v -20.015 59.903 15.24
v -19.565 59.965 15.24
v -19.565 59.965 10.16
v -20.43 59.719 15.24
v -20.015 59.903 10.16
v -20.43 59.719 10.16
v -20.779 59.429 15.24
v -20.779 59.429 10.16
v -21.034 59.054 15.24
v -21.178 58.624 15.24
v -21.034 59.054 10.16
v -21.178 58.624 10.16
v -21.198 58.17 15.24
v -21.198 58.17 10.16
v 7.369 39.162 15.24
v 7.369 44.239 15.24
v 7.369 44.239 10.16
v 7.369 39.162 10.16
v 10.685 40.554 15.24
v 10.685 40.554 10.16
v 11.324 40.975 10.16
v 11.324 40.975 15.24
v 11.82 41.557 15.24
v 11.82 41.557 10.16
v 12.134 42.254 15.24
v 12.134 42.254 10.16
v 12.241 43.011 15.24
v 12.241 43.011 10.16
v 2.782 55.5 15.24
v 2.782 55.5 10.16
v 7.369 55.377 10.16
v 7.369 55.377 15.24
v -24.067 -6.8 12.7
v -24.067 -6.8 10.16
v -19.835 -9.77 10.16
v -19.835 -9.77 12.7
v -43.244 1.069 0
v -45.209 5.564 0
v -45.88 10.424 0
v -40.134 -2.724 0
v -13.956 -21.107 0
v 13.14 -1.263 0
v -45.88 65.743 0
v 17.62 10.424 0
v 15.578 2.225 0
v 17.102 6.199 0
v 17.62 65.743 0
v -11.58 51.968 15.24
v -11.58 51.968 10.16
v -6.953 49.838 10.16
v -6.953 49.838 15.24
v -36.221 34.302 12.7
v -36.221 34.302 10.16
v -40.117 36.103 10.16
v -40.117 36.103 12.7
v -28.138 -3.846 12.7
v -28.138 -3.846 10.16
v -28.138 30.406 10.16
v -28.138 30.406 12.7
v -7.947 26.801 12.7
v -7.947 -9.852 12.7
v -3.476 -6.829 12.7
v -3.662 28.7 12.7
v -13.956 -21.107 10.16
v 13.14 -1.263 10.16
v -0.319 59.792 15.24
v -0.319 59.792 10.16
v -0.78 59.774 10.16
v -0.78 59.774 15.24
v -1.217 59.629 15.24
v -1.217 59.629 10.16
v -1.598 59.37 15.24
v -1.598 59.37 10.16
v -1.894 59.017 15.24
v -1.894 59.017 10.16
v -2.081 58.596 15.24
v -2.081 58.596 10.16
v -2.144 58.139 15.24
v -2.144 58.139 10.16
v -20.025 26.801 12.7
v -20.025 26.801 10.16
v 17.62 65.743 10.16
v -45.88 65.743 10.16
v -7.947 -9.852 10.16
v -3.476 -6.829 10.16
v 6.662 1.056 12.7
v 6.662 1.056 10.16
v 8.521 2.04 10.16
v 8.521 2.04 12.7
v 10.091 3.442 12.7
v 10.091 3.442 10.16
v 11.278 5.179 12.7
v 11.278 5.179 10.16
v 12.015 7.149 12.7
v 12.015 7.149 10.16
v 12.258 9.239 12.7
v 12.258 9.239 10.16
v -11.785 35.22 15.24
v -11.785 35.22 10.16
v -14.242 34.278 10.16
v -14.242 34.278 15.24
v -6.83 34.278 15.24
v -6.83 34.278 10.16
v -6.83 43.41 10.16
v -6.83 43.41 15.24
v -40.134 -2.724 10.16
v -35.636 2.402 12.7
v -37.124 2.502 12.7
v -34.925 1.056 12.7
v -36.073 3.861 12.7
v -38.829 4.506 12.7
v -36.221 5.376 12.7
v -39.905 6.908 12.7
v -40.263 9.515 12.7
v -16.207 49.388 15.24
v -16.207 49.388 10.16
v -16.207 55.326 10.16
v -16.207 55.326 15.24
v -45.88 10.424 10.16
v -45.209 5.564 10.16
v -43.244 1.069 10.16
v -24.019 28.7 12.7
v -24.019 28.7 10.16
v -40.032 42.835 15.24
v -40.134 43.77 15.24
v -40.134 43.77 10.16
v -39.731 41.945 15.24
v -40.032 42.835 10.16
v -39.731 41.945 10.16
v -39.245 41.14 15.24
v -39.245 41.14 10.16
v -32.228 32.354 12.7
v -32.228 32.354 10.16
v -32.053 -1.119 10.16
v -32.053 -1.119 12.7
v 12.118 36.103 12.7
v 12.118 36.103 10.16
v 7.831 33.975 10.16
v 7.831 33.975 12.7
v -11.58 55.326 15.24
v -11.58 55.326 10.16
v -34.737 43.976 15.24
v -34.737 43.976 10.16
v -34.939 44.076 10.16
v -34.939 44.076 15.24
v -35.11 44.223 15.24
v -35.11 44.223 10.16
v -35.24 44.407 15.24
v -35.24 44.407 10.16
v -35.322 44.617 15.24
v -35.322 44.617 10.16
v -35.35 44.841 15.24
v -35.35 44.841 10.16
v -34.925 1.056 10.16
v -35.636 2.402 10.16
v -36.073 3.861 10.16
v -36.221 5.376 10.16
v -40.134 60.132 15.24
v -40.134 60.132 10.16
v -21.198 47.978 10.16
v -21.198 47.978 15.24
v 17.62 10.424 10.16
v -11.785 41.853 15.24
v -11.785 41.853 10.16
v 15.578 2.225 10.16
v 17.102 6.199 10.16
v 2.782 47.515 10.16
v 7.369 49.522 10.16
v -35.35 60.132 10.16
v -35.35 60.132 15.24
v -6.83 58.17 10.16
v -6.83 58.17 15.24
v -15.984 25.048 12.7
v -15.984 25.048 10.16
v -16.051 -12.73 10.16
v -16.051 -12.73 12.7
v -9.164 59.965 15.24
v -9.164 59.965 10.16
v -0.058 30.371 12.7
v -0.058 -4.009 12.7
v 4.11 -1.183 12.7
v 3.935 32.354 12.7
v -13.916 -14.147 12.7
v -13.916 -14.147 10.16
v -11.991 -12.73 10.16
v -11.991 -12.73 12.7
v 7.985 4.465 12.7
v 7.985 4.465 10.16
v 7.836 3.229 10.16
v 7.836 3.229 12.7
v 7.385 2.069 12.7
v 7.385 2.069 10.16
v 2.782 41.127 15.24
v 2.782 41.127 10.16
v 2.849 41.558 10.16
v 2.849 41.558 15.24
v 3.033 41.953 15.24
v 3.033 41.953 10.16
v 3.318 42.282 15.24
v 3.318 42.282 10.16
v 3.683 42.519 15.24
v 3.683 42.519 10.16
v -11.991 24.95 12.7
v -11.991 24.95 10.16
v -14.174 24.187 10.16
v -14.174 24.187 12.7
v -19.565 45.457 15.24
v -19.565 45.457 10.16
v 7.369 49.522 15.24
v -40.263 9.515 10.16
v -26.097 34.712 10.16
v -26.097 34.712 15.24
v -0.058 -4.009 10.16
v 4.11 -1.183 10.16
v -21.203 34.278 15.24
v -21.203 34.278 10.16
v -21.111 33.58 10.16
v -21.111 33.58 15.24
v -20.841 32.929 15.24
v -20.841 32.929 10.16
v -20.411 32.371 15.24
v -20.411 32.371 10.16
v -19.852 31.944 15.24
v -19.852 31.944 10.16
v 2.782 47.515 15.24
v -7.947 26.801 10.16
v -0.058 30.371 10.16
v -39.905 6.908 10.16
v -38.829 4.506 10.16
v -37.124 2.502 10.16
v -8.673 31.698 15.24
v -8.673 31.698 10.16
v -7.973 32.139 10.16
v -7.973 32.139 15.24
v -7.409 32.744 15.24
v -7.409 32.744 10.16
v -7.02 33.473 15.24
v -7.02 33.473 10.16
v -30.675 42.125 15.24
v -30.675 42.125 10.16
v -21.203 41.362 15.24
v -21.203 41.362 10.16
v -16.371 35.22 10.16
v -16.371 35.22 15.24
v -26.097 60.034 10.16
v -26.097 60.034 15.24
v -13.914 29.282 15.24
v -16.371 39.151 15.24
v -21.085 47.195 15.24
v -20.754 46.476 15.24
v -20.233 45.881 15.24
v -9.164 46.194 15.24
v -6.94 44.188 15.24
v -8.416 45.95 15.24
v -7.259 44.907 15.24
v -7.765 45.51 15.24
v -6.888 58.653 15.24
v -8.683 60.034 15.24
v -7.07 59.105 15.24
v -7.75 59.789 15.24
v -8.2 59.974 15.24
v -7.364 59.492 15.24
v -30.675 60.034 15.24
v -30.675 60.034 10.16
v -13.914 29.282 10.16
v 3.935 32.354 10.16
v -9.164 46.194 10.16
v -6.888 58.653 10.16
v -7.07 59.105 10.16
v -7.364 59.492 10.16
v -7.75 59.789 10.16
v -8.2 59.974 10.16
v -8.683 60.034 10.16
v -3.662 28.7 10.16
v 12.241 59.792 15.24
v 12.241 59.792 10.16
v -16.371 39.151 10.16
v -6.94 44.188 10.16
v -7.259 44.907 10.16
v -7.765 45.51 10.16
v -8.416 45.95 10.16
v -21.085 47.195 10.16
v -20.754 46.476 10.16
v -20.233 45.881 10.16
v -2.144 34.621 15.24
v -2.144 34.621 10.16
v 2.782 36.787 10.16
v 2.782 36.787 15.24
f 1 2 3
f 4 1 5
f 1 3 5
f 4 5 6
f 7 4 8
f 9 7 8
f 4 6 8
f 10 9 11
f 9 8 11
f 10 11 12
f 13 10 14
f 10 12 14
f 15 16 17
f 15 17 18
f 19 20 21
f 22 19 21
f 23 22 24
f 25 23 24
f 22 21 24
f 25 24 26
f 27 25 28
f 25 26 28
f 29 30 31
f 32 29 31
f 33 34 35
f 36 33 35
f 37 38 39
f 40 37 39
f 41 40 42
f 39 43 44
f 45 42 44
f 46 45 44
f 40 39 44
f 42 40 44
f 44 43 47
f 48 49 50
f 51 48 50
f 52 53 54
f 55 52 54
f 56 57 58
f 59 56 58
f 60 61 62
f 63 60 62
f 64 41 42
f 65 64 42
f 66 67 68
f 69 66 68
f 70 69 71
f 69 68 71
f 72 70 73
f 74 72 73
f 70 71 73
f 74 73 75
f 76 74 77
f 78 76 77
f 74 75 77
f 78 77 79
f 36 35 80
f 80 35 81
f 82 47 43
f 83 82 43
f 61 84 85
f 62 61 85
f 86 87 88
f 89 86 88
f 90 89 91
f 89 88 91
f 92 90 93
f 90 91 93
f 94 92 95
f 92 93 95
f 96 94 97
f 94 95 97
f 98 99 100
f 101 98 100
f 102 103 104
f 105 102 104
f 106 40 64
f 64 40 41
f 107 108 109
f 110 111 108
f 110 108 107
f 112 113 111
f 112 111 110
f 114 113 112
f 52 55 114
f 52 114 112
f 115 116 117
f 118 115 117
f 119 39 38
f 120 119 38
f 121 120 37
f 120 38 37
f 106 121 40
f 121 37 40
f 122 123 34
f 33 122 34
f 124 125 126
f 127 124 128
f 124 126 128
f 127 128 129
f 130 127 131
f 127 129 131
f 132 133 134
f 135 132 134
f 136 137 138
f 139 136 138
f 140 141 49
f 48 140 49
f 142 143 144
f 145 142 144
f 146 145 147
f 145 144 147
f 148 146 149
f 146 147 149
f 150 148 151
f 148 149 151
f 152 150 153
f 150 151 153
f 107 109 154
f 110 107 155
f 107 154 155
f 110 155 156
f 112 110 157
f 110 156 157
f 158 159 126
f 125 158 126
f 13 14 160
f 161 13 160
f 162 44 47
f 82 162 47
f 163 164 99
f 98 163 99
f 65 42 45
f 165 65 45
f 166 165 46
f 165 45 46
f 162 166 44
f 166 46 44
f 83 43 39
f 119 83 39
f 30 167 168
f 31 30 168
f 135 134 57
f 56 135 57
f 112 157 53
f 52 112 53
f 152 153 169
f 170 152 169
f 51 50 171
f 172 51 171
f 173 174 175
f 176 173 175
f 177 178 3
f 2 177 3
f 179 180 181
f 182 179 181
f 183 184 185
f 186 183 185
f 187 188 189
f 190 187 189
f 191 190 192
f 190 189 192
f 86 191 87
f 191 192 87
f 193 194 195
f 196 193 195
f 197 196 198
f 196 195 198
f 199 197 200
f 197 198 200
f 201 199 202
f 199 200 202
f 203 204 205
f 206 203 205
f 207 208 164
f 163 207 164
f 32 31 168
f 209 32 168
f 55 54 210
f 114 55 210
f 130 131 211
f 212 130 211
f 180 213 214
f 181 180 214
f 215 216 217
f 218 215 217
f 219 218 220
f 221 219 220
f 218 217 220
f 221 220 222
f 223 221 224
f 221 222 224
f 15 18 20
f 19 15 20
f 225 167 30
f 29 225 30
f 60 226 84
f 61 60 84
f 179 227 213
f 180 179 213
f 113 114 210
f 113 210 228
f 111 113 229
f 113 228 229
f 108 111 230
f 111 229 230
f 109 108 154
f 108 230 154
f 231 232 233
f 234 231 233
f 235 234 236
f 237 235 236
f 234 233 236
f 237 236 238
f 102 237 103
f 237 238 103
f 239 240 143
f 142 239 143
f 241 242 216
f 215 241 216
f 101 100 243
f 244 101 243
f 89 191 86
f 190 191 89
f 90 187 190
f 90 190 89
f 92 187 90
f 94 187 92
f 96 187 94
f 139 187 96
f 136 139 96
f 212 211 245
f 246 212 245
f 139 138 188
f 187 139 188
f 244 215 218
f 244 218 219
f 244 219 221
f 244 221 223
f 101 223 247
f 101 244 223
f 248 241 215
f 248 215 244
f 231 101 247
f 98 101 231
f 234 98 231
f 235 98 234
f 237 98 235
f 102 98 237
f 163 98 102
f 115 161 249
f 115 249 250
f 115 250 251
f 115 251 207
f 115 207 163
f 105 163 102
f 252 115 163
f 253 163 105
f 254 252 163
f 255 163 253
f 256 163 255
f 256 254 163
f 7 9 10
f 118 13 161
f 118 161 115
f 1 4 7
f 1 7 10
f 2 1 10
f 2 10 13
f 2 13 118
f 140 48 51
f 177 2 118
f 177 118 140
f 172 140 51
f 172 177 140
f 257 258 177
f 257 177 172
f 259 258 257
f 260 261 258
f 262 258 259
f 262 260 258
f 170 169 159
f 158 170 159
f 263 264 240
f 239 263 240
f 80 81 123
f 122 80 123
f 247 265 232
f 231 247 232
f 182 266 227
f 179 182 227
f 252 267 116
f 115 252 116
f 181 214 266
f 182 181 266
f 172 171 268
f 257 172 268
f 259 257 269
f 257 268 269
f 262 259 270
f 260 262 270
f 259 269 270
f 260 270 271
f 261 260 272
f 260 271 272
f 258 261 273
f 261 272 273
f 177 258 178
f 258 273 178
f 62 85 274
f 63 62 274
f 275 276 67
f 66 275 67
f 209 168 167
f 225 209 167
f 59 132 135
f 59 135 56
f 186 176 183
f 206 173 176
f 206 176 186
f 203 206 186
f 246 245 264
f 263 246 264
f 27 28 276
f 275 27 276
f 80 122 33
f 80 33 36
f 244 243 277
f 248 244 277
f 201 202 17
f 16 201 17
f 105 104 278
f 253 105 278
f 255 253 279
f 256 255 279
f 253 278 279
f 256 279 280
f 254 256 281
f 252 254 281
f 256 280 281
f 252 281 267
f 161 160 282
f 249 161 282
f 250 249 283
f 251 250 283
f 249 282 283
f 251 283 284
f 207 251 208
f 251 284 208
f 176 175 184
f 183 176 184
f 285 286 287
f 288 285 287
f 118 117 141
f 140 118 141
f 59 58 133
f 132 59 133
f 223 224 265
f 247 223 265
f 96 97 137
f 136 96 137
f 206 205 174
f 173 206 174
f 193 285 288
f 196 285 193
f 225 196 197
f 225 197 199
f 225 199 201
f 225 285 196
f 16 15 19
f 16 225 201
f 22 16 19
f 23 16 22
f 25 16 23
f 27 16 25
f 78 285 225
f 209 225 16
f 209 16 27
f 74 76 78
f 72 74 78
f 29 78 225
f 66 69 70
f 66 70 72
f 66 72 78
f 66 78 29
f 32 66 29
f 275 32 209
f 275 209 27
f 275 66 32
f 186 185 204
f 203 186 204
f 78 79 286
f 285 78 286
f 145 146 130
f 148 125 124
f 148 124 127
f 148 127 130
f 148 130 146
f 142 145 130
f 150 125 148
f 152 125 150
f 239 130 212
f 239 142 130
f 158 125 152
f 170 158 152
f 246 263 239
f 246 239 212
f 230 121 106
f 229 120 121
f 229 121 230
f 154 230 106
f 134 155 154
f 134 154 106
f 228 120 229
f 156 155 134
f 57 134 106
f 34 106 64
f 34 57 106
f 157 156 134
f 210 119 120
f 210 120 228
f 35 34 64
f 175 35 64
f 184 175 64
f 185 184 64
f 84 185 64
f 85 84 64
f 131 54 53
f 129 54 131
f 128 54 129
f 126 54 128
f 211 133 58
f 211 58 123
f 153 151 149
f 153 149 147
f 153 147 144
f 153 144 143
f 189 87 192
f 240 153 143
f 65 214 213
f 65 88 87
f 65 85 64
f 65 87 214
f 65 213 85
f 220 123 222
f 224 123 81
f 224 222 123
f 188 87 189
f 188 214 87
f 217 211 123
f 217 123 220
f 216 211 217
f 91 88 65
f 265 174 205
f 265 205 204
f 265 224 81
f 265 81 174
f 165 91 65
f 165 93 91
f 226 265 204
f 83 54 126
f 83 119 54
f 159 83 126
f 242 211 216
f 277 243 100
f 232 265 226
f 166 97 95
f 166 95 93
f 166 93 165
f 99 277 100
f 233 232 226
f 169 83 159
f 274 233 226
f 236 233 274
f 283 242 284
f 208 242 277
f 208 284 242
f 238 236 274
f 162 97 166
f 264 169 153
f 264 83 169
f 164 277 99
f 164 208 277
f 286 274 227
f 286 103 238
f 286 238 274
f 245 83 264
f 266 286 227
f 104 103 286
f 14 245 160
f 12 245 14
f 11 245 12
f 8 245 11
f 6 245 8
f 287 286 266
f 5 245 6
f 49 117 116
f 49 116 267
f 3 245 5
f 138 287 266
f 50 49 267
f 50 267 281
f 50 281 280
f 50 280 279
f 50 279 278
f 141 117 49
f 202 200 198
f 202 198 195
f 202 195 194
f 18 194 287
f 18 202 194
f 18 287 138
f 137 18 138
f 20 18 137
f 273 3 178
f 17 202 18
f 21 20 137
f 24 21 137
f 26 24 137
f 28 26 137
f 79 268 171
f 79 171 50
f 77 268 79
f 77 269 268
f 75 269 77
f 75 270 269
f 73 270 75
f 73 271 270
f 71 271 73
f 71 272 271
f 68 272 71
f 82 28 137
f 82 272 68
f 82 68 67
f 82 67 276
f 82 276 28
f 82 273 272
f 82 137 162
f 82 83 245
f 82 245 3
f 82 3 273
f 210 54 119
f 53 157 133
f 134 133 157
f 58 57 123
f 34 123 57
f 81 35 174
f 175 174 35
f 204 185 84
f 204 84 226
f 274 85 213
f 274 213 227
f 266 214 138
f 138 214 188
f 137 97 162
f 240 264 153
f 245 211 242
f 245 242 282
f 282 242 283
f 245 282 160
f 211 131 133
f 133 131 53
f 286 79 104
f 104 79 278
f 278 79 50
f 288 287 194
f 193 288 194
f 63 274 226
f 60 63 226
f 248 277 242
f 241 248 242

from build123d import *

# Parameters (mm, degrees)
F1_DEPTH = 15.24
F2_DEPTH = 12.7
F3_DEPTH = 10.16


with BuildPart() as f1:
    # F0 (on Top) → F1 (new body)
    with BuildSketch(Plane.XY):
        with BuildLine():
            Line((-35.3495, 60.131524), (-40.133959, 60.131524))
            Line((-40.133959, 60.131524), (-40.133959, 43.769562))
            ThreePointArc((-40.133959, 43.769562), (-39.905763, 42.381693), (-39.245203, 41.139955))
            Line((-39.245203, 41.139955), (-26.097199, 34.712043))
            Line((-26.097199, 34.712043), (-26.097199, 60.034128))
            Line((-26.097199, 60.034128), (-30.674654, 60.034128))
            Line((-30.674654, 60.034128), (-30.674654, 42.308667))
            Line((-30.674654, 42.308667), (-30.674654, 42.125131))
            Line((-30.674654, 42.125131), (-34.736989, 43.975933))
            ThreePointArc((-34.736989, 43.975933), (-35.180866, 44.310949), (-35.3495, 44.840879))
            Line((-35.3495, 44.840879), (-35.3495, 60.131524))
        make_face()
        with BuildLine():
            Line((-11.580281, 51.967774), (-6.953094, 49.838448))
            Line((-6.953094, 49.838448), (-6.830248, 58.170216))
            ThreePointArc((-6.830248, 58.170216), (-7.547014, 59.653243), (-9.164316, 59.965426))
            Line((-9.164316, 59.965426), (-19.565252, 59.965426))
            ThreePointArc((-19.565252, 59.965426), (-20.778535, 59.428841), (-21.197871, 58.170216))
            Line((-21.197871, 58.170216), (-21.197871, 47.978059))
            ThreePointArc((-21.197871, 47.978059), (-20.754073, 46.476274), (-19.565252, 45.456952))
            Line((-19.565252, 45.456952), (-11.785025, 41.853478))
            Line((-11.785025, 41.853478), (-11.785025, 35.219812))
            Line((-11.785025, 35.219812), (-14.241938, 34.277995))
            Line((-14.241938, 34.277995), (-16.371263, 35.219812))
            Line((-16.371263, 35.219812), (-16.371263, 39.150875))
            Line((-16.371263, 39.150875), (-21.203195, 41.362097))
            Line((-21.203195, 41.362097), (-21.203195, 34.277995))
            ThreePointArc((-21.203195, 34.277995), (-20.840997, 32.929487), (-19.85189, 31.943927))
            Line((-19.85189, 31.943927), (-13.914351, 29.282272))
            Line((-13.914351, 29.282272), (-8.672934, 31.698236))
            ThreePointArc((-8.672934, 31.698236), (-7.409398, 32.743692), (-6.830248, 34.277995))
            Line((-6.830248, 34.277995), (-6.830248, 43.409521))
            ThreePointArc((-6.830248, 43.409521), (-7.490944, 45.226204), (-9.164316, 46.194026))
            Line((-9.164316, 46.194026), (-16.207468, 49.388015))
            Line((-16.207468, 49.388015), (-16.207468, 55.325555))
            Line((-16.207468, 55.325555), (-11.580281, 55.325555))
            Line((-11.580281, 55.325555), (-11.580281, 51.967774))
        make_face()
        with BuildLine():
            Line((-2.144403, 34.621232), (2.7823, 36.786695))
            Line((2.7823, 36.786695), (2.7823, 41.127243))
            ThreePointArc((2.7823, 41.127243), (3.032611, 41.95286), (3.683167, 42.519495))
            Line((3.683167, 42.519495), (7.368538, 44.239336))
            Line((7.368538, 44.239336), (7.368538, 39.161714))
            Line((7.368538, 39.161714), (10.685371, 40.553966))
            ThreePointArc((10.685371, 40.553966), (11.819683, 41.556771), (12.241417, 43.010876))
            Line((12.241417, 43.010876), (12.241417, 59.792126))
            Line((12.241417, 59.792126), (-0.319427, 59.792126))
            ThreePointArc((-0.319427, 59.792126), (-1.598421, 59.370402), (-2.144403, 58.139313))
            Line((-2.144403, 58.139313), (-2.144403, 34.621232))
        make_face()
        Polygon((2.7823, 47.515221), (2.7823, 55.500185), (7.368538, 55.377342), (7.368538, 49.521698), align=None, mode=Mode.SUBTRACT)
    extrude(amount=F1_DEPTH)


with BuildPart() as f2:
    # F0 (on Top) → F2 (new body)
    with BuildSketch(Plane.XY):
        with BuildLine():
            Line((-36.221196, 34.301637), (-40.116899, 36.103401))
            Line((-40.116899, 36.103401), (-40.26299, 9.51521))
            ThreePointArc((-40.26299, 9.51521), (-38.829457, 4.505833), (-34.924753, 1.055882))
            ThreePointArc((-34.924753, 1.055882), (-35.890099, 3.120786), (-36.221196, 5.376023))
            Line((-36.221196, 5.376023), (-36.221196, 34.301637))
        make_face()
        Polygon((-28.137608, 30.40593), (-32.228097, 32.353785), (-32.053457, -1.11851), (-28.137608, -3.845503), align=None)
        Polygon((-20.025467, 26.800887), (-24.018567, 28.700044), (-24.067261, -6.799573), (-19.834662, -9.769816), align=None)
        Polygon((-14.174307, 24.187266), (-15.983673, 25.047818), (-16.051294, -12.73049), (-13.916418, -14.146952), (-11.990574, -12.73049), (-11.990574, 24.950425), align=None)
        Polygon((-3.661716, 28.700044), (-7.946991, 26.800887), (-7.946991, -9.852093), (-3.476346, -6.828905), align=None)
        Polygon((3.93491, 32.353785), (-0.058187, 30.371067), (-0.058187, -4.008536), (4.109884, -1.182727), align=None)
        with BuildLine():
            Line((12.117932, 36.103401), (7.830616, 33.974593))
            Line((7.830616, 33.974593), (7.984579, 4.465428))
            ThreePointArc((7.984579, 4.465428), (7.646931, 2.635085), (6.661903, 1.055882))
            ThreePointArc((6.661903, 1.055882), (10.736967, 4.274239), (12.258095, 9.23913))
            Line((12.258095, 9.23913), (12.117932, 36.103401))
        make_face()
    extrude(amount=F2_DEPTH)


with BuildPart() as f3:
    # F0 (on Top) → F3 (new body)
    with BuildSketch(Plane.XY):
        with BuildLine():
            Line((17.619875, 65.742654), (-45.880125, 65.742654))
            Line((-45.880125, 65.742654), (-45.880125, 10.423636))
            ThreePointArc((-45.880125, 10.423636), (-44.380848, 3.249228), (-40.133959, -2.724371))
            Line((-40.133959, -2.724371), (-13.956032, -21.107036))
            Line((-13.956032, -21.107036), (13.139814, -1.26348))
            ThreePointArc((13.139814, -1.26348), (16.461486, 4.165449), (17.619875, 10.423636))
            Line((17.619875, 10.423636), (17.619875, 65.742654))
        make_face()
        Polygon((-32.053457, -1.11851), (-32.228097, 32.353785), (-28.137608, 30.40593), (-28.137608, -3.845503), align=None, mode=Mode.SUBTRACT)
        with BuildLine():
            Line((-40.26299, 9.51521), (-40.116899, 36.103401))
            Line((-40.116899, 36.103401), (-36.221196, 34.301637))
            Line((-36.221196, 34.301637), (-36.221196, 5.376023))
            ThreePointArc((-36.221196, 5.376023), (-35.890099, 3.120786), (-34.924753, 1.055882))
            ThreePointArc((-34.924753, 1.055882), (-38.829457, 4.505833), (-40.26299, 9.51521))
        make_face(mode=Mode.SUBTRACT)
        Polygon((-24.067261, -6.799573), (-24.018567, 28.700044), (-20.025467, 26.800887), (-19.834662, -9.769816), align=None, mode=Mode.SUBTRACT)
        Polygon((-16.051294, -12.73049), (-15.983673, 25.047818), (-14.174307, 24.187266), (-11.990574, 24.950425), (-11.990574, -12.73049), (-13.916418, -14.146952), align=None, mode=Mode.SUBTRACT)
        Polygon((-7.946991, -9.852093), (-7.946991, 26.800887), (-3.661716, 28.700044), (-3.476346, -6.828905), align=None, mode=Mode.SUBTRACT)
        Polygon((-0.058187, -4.008536), (-0.058187, 30.371067), (3.93491, 32.353785), (4.109884, -1.182727), align=None, mode=Mode.SUBTRACT)
        with BuildLine():
            Line((7.984579, 4.465428), (7.830616, 33.974593))
            Line((7.830616, 33.974593), (12.117932, 36.103401))
            Line((12.117932, 36.103401), (12.258095, 9.23913))
            ThreePointArc((12.258095, 9.23913), (10.736967, 4.274239), (6.661903, 1.055882))
            ThreePointArc((6.661903, 1.055882), (7.646931, 2.635085), (7.984579, 4.465428))
        make_face(mode=Mode.SUBTRACT)
        with BuildLine():
            Line((-40.133959, 43.769562), (-40.133959, 60.131524))
            Line((-40.133959, 60.131524), (-35.3495, 60.131524))
            Line((-35.3495, 60.131524), (-35.3495, 44.840879))
            ThreePointArc((-35.3495, 44.840879), (-35.180866, 44.310949), (-34.736989, 43.975933))
            Line((-34.736989, 43.975933), (-30.674654, 42.125131))
            Line((-30.674654, 42.125131), (-30.674654, 42.308667))
            Line((-30.674654, 42.308667), (-30.674654, 60.034128))
            Line((-30.674654, 60.034128), (-26.097199, 60.034128))
            Line((-26.097199, 60.034128), (-26.097199, 34.712043))
            Line((-26.097199, 34.712043), (-39.245203, 41.139955))
            ThreePointArc((-39.245203, 41.139955), (-39.905763, 42.381693), (-40.133959, 43.769562))
        make_face(mode=Mode.SUBTRACT)
        with BuildLine():
            Line((-6.830248, 58.170216), (-6.953094, 49.838448))
            Line((-6.953094, 49.838448), (-11.580281, 51.967774))
            Line((-11.580281, 51.967774), (-11.580281, 55.325555))
            Line((-11.580281, 55.325555), (-16.207468, 55.325555))
            Line((-16.207468, 55.325555), (-16.207468, 49.388015))
            Line((-16.207468, 49.388015), (-9.164316, 46.194026))
            ThreePointArc((-9.164316, 46.194026), (-7.490944, 45.226204), (-6.830248, 43.409521))
            Line((-6.830248, 43.409521), (-6.830248, 34.277995))
            ThreePointArc((-6.830248, 34.277995), (-7.409398, 32.743692), (-8.672934, 31.698236))
            Line((-8.672934, 31.698236), (-13.914351, 29.282272))
            Line((-13.914351, 29.282272), (-19.85189, 31.943927))
            ThreePointArc((-19.85189, 31.943927), (-20.840997, 32.929487), (-21.203195, 34.277995))
            Line((-21.203195, 34.277995), (-21.203195, 41.362097))
            Line((-21.203195, 41.362097), (-16.371263, 39.150875))
            Line((-16.371263, 39.150875), (-16.371263, 35.219812))
            Line((-16.371263, 35.219812), (-14.241938, 34.277995))
            Line((-14.241938, 34.277995), (-11.785025, 35.219812))
            Line((-11.785025, 35.219812), (-11.785025, 41.853478))
            Line((-11.785025, 41.853478), (-19.565252, 45.456952))
            ThreePointArc((-19.565252, 45.456952), (-20.754073, 46.476274), (-21.197871, 47.978059))
            Line((-21.197871, 47.978059), (-21.197871, 58.170216))
            ThreePointArc((-21.197871, 58.170216), (-20.778535, 59.428841), (-19.565252, 59.965426))
            Line((-19.565252, 59.965426), (-9.164316, 59.965426))
            ThreePointArc((-9.164316, 59.965426), (-7.547014, 59.653243), (-6.830248, 58.170216))
        make_face(mode=Mode.SUBTRACT)
        with BuildLine():
            Line((2.7823, 41.127243), (2.7823, 36.786695))
            Line((2.7823, 36.786695), (-2.144403, 34.621232))
            Line((-2.144403, 34.621232), (-2.144403, 58.139313))
            ThreePointArc((-2.144403, 58.139313), (-1.598421, 59.370402), (-0.319427, 59.792126))
            Line((-0.319427, 59.792126), (12.241417, 59.792126))
            Line((12.241417, 59.792126), (12.241417, 43.010876))
            ThreePointArc((12.241417, 43.010876), (11.819683, 41.556771), (10.685371, 40.553966))
            Line((10.685371, 40.553966), (7.368538, 39.161714))
            Line((7.368538, 39.161714), (7.368538, 44.239336))
            Line((7.368538, 44.239336), (3.683167, 42.519495))
            ThreePointArc((3.683167, 42.519495), (3.032611, 41.95286), (2.7823, 41.127243))
        make_face(mode=Mode.SUBTRACT)
        Polygon((7.368538, 55.377342), (2.7823, 55.500185), (2.7823, 47.515221), (7.368538, 49.521698), align=None)
    extrude(amount=F3_DEPTH)


with BuildPart() as f2_1:
    add(f2.part)

    # F4: union F3
    add(f3.part)

    # F5: union 


with BuildPart() as f1_1:
    add(f1.part)

    # F6: union F2
    add(f2_1.part)


solid = f1_1.part
